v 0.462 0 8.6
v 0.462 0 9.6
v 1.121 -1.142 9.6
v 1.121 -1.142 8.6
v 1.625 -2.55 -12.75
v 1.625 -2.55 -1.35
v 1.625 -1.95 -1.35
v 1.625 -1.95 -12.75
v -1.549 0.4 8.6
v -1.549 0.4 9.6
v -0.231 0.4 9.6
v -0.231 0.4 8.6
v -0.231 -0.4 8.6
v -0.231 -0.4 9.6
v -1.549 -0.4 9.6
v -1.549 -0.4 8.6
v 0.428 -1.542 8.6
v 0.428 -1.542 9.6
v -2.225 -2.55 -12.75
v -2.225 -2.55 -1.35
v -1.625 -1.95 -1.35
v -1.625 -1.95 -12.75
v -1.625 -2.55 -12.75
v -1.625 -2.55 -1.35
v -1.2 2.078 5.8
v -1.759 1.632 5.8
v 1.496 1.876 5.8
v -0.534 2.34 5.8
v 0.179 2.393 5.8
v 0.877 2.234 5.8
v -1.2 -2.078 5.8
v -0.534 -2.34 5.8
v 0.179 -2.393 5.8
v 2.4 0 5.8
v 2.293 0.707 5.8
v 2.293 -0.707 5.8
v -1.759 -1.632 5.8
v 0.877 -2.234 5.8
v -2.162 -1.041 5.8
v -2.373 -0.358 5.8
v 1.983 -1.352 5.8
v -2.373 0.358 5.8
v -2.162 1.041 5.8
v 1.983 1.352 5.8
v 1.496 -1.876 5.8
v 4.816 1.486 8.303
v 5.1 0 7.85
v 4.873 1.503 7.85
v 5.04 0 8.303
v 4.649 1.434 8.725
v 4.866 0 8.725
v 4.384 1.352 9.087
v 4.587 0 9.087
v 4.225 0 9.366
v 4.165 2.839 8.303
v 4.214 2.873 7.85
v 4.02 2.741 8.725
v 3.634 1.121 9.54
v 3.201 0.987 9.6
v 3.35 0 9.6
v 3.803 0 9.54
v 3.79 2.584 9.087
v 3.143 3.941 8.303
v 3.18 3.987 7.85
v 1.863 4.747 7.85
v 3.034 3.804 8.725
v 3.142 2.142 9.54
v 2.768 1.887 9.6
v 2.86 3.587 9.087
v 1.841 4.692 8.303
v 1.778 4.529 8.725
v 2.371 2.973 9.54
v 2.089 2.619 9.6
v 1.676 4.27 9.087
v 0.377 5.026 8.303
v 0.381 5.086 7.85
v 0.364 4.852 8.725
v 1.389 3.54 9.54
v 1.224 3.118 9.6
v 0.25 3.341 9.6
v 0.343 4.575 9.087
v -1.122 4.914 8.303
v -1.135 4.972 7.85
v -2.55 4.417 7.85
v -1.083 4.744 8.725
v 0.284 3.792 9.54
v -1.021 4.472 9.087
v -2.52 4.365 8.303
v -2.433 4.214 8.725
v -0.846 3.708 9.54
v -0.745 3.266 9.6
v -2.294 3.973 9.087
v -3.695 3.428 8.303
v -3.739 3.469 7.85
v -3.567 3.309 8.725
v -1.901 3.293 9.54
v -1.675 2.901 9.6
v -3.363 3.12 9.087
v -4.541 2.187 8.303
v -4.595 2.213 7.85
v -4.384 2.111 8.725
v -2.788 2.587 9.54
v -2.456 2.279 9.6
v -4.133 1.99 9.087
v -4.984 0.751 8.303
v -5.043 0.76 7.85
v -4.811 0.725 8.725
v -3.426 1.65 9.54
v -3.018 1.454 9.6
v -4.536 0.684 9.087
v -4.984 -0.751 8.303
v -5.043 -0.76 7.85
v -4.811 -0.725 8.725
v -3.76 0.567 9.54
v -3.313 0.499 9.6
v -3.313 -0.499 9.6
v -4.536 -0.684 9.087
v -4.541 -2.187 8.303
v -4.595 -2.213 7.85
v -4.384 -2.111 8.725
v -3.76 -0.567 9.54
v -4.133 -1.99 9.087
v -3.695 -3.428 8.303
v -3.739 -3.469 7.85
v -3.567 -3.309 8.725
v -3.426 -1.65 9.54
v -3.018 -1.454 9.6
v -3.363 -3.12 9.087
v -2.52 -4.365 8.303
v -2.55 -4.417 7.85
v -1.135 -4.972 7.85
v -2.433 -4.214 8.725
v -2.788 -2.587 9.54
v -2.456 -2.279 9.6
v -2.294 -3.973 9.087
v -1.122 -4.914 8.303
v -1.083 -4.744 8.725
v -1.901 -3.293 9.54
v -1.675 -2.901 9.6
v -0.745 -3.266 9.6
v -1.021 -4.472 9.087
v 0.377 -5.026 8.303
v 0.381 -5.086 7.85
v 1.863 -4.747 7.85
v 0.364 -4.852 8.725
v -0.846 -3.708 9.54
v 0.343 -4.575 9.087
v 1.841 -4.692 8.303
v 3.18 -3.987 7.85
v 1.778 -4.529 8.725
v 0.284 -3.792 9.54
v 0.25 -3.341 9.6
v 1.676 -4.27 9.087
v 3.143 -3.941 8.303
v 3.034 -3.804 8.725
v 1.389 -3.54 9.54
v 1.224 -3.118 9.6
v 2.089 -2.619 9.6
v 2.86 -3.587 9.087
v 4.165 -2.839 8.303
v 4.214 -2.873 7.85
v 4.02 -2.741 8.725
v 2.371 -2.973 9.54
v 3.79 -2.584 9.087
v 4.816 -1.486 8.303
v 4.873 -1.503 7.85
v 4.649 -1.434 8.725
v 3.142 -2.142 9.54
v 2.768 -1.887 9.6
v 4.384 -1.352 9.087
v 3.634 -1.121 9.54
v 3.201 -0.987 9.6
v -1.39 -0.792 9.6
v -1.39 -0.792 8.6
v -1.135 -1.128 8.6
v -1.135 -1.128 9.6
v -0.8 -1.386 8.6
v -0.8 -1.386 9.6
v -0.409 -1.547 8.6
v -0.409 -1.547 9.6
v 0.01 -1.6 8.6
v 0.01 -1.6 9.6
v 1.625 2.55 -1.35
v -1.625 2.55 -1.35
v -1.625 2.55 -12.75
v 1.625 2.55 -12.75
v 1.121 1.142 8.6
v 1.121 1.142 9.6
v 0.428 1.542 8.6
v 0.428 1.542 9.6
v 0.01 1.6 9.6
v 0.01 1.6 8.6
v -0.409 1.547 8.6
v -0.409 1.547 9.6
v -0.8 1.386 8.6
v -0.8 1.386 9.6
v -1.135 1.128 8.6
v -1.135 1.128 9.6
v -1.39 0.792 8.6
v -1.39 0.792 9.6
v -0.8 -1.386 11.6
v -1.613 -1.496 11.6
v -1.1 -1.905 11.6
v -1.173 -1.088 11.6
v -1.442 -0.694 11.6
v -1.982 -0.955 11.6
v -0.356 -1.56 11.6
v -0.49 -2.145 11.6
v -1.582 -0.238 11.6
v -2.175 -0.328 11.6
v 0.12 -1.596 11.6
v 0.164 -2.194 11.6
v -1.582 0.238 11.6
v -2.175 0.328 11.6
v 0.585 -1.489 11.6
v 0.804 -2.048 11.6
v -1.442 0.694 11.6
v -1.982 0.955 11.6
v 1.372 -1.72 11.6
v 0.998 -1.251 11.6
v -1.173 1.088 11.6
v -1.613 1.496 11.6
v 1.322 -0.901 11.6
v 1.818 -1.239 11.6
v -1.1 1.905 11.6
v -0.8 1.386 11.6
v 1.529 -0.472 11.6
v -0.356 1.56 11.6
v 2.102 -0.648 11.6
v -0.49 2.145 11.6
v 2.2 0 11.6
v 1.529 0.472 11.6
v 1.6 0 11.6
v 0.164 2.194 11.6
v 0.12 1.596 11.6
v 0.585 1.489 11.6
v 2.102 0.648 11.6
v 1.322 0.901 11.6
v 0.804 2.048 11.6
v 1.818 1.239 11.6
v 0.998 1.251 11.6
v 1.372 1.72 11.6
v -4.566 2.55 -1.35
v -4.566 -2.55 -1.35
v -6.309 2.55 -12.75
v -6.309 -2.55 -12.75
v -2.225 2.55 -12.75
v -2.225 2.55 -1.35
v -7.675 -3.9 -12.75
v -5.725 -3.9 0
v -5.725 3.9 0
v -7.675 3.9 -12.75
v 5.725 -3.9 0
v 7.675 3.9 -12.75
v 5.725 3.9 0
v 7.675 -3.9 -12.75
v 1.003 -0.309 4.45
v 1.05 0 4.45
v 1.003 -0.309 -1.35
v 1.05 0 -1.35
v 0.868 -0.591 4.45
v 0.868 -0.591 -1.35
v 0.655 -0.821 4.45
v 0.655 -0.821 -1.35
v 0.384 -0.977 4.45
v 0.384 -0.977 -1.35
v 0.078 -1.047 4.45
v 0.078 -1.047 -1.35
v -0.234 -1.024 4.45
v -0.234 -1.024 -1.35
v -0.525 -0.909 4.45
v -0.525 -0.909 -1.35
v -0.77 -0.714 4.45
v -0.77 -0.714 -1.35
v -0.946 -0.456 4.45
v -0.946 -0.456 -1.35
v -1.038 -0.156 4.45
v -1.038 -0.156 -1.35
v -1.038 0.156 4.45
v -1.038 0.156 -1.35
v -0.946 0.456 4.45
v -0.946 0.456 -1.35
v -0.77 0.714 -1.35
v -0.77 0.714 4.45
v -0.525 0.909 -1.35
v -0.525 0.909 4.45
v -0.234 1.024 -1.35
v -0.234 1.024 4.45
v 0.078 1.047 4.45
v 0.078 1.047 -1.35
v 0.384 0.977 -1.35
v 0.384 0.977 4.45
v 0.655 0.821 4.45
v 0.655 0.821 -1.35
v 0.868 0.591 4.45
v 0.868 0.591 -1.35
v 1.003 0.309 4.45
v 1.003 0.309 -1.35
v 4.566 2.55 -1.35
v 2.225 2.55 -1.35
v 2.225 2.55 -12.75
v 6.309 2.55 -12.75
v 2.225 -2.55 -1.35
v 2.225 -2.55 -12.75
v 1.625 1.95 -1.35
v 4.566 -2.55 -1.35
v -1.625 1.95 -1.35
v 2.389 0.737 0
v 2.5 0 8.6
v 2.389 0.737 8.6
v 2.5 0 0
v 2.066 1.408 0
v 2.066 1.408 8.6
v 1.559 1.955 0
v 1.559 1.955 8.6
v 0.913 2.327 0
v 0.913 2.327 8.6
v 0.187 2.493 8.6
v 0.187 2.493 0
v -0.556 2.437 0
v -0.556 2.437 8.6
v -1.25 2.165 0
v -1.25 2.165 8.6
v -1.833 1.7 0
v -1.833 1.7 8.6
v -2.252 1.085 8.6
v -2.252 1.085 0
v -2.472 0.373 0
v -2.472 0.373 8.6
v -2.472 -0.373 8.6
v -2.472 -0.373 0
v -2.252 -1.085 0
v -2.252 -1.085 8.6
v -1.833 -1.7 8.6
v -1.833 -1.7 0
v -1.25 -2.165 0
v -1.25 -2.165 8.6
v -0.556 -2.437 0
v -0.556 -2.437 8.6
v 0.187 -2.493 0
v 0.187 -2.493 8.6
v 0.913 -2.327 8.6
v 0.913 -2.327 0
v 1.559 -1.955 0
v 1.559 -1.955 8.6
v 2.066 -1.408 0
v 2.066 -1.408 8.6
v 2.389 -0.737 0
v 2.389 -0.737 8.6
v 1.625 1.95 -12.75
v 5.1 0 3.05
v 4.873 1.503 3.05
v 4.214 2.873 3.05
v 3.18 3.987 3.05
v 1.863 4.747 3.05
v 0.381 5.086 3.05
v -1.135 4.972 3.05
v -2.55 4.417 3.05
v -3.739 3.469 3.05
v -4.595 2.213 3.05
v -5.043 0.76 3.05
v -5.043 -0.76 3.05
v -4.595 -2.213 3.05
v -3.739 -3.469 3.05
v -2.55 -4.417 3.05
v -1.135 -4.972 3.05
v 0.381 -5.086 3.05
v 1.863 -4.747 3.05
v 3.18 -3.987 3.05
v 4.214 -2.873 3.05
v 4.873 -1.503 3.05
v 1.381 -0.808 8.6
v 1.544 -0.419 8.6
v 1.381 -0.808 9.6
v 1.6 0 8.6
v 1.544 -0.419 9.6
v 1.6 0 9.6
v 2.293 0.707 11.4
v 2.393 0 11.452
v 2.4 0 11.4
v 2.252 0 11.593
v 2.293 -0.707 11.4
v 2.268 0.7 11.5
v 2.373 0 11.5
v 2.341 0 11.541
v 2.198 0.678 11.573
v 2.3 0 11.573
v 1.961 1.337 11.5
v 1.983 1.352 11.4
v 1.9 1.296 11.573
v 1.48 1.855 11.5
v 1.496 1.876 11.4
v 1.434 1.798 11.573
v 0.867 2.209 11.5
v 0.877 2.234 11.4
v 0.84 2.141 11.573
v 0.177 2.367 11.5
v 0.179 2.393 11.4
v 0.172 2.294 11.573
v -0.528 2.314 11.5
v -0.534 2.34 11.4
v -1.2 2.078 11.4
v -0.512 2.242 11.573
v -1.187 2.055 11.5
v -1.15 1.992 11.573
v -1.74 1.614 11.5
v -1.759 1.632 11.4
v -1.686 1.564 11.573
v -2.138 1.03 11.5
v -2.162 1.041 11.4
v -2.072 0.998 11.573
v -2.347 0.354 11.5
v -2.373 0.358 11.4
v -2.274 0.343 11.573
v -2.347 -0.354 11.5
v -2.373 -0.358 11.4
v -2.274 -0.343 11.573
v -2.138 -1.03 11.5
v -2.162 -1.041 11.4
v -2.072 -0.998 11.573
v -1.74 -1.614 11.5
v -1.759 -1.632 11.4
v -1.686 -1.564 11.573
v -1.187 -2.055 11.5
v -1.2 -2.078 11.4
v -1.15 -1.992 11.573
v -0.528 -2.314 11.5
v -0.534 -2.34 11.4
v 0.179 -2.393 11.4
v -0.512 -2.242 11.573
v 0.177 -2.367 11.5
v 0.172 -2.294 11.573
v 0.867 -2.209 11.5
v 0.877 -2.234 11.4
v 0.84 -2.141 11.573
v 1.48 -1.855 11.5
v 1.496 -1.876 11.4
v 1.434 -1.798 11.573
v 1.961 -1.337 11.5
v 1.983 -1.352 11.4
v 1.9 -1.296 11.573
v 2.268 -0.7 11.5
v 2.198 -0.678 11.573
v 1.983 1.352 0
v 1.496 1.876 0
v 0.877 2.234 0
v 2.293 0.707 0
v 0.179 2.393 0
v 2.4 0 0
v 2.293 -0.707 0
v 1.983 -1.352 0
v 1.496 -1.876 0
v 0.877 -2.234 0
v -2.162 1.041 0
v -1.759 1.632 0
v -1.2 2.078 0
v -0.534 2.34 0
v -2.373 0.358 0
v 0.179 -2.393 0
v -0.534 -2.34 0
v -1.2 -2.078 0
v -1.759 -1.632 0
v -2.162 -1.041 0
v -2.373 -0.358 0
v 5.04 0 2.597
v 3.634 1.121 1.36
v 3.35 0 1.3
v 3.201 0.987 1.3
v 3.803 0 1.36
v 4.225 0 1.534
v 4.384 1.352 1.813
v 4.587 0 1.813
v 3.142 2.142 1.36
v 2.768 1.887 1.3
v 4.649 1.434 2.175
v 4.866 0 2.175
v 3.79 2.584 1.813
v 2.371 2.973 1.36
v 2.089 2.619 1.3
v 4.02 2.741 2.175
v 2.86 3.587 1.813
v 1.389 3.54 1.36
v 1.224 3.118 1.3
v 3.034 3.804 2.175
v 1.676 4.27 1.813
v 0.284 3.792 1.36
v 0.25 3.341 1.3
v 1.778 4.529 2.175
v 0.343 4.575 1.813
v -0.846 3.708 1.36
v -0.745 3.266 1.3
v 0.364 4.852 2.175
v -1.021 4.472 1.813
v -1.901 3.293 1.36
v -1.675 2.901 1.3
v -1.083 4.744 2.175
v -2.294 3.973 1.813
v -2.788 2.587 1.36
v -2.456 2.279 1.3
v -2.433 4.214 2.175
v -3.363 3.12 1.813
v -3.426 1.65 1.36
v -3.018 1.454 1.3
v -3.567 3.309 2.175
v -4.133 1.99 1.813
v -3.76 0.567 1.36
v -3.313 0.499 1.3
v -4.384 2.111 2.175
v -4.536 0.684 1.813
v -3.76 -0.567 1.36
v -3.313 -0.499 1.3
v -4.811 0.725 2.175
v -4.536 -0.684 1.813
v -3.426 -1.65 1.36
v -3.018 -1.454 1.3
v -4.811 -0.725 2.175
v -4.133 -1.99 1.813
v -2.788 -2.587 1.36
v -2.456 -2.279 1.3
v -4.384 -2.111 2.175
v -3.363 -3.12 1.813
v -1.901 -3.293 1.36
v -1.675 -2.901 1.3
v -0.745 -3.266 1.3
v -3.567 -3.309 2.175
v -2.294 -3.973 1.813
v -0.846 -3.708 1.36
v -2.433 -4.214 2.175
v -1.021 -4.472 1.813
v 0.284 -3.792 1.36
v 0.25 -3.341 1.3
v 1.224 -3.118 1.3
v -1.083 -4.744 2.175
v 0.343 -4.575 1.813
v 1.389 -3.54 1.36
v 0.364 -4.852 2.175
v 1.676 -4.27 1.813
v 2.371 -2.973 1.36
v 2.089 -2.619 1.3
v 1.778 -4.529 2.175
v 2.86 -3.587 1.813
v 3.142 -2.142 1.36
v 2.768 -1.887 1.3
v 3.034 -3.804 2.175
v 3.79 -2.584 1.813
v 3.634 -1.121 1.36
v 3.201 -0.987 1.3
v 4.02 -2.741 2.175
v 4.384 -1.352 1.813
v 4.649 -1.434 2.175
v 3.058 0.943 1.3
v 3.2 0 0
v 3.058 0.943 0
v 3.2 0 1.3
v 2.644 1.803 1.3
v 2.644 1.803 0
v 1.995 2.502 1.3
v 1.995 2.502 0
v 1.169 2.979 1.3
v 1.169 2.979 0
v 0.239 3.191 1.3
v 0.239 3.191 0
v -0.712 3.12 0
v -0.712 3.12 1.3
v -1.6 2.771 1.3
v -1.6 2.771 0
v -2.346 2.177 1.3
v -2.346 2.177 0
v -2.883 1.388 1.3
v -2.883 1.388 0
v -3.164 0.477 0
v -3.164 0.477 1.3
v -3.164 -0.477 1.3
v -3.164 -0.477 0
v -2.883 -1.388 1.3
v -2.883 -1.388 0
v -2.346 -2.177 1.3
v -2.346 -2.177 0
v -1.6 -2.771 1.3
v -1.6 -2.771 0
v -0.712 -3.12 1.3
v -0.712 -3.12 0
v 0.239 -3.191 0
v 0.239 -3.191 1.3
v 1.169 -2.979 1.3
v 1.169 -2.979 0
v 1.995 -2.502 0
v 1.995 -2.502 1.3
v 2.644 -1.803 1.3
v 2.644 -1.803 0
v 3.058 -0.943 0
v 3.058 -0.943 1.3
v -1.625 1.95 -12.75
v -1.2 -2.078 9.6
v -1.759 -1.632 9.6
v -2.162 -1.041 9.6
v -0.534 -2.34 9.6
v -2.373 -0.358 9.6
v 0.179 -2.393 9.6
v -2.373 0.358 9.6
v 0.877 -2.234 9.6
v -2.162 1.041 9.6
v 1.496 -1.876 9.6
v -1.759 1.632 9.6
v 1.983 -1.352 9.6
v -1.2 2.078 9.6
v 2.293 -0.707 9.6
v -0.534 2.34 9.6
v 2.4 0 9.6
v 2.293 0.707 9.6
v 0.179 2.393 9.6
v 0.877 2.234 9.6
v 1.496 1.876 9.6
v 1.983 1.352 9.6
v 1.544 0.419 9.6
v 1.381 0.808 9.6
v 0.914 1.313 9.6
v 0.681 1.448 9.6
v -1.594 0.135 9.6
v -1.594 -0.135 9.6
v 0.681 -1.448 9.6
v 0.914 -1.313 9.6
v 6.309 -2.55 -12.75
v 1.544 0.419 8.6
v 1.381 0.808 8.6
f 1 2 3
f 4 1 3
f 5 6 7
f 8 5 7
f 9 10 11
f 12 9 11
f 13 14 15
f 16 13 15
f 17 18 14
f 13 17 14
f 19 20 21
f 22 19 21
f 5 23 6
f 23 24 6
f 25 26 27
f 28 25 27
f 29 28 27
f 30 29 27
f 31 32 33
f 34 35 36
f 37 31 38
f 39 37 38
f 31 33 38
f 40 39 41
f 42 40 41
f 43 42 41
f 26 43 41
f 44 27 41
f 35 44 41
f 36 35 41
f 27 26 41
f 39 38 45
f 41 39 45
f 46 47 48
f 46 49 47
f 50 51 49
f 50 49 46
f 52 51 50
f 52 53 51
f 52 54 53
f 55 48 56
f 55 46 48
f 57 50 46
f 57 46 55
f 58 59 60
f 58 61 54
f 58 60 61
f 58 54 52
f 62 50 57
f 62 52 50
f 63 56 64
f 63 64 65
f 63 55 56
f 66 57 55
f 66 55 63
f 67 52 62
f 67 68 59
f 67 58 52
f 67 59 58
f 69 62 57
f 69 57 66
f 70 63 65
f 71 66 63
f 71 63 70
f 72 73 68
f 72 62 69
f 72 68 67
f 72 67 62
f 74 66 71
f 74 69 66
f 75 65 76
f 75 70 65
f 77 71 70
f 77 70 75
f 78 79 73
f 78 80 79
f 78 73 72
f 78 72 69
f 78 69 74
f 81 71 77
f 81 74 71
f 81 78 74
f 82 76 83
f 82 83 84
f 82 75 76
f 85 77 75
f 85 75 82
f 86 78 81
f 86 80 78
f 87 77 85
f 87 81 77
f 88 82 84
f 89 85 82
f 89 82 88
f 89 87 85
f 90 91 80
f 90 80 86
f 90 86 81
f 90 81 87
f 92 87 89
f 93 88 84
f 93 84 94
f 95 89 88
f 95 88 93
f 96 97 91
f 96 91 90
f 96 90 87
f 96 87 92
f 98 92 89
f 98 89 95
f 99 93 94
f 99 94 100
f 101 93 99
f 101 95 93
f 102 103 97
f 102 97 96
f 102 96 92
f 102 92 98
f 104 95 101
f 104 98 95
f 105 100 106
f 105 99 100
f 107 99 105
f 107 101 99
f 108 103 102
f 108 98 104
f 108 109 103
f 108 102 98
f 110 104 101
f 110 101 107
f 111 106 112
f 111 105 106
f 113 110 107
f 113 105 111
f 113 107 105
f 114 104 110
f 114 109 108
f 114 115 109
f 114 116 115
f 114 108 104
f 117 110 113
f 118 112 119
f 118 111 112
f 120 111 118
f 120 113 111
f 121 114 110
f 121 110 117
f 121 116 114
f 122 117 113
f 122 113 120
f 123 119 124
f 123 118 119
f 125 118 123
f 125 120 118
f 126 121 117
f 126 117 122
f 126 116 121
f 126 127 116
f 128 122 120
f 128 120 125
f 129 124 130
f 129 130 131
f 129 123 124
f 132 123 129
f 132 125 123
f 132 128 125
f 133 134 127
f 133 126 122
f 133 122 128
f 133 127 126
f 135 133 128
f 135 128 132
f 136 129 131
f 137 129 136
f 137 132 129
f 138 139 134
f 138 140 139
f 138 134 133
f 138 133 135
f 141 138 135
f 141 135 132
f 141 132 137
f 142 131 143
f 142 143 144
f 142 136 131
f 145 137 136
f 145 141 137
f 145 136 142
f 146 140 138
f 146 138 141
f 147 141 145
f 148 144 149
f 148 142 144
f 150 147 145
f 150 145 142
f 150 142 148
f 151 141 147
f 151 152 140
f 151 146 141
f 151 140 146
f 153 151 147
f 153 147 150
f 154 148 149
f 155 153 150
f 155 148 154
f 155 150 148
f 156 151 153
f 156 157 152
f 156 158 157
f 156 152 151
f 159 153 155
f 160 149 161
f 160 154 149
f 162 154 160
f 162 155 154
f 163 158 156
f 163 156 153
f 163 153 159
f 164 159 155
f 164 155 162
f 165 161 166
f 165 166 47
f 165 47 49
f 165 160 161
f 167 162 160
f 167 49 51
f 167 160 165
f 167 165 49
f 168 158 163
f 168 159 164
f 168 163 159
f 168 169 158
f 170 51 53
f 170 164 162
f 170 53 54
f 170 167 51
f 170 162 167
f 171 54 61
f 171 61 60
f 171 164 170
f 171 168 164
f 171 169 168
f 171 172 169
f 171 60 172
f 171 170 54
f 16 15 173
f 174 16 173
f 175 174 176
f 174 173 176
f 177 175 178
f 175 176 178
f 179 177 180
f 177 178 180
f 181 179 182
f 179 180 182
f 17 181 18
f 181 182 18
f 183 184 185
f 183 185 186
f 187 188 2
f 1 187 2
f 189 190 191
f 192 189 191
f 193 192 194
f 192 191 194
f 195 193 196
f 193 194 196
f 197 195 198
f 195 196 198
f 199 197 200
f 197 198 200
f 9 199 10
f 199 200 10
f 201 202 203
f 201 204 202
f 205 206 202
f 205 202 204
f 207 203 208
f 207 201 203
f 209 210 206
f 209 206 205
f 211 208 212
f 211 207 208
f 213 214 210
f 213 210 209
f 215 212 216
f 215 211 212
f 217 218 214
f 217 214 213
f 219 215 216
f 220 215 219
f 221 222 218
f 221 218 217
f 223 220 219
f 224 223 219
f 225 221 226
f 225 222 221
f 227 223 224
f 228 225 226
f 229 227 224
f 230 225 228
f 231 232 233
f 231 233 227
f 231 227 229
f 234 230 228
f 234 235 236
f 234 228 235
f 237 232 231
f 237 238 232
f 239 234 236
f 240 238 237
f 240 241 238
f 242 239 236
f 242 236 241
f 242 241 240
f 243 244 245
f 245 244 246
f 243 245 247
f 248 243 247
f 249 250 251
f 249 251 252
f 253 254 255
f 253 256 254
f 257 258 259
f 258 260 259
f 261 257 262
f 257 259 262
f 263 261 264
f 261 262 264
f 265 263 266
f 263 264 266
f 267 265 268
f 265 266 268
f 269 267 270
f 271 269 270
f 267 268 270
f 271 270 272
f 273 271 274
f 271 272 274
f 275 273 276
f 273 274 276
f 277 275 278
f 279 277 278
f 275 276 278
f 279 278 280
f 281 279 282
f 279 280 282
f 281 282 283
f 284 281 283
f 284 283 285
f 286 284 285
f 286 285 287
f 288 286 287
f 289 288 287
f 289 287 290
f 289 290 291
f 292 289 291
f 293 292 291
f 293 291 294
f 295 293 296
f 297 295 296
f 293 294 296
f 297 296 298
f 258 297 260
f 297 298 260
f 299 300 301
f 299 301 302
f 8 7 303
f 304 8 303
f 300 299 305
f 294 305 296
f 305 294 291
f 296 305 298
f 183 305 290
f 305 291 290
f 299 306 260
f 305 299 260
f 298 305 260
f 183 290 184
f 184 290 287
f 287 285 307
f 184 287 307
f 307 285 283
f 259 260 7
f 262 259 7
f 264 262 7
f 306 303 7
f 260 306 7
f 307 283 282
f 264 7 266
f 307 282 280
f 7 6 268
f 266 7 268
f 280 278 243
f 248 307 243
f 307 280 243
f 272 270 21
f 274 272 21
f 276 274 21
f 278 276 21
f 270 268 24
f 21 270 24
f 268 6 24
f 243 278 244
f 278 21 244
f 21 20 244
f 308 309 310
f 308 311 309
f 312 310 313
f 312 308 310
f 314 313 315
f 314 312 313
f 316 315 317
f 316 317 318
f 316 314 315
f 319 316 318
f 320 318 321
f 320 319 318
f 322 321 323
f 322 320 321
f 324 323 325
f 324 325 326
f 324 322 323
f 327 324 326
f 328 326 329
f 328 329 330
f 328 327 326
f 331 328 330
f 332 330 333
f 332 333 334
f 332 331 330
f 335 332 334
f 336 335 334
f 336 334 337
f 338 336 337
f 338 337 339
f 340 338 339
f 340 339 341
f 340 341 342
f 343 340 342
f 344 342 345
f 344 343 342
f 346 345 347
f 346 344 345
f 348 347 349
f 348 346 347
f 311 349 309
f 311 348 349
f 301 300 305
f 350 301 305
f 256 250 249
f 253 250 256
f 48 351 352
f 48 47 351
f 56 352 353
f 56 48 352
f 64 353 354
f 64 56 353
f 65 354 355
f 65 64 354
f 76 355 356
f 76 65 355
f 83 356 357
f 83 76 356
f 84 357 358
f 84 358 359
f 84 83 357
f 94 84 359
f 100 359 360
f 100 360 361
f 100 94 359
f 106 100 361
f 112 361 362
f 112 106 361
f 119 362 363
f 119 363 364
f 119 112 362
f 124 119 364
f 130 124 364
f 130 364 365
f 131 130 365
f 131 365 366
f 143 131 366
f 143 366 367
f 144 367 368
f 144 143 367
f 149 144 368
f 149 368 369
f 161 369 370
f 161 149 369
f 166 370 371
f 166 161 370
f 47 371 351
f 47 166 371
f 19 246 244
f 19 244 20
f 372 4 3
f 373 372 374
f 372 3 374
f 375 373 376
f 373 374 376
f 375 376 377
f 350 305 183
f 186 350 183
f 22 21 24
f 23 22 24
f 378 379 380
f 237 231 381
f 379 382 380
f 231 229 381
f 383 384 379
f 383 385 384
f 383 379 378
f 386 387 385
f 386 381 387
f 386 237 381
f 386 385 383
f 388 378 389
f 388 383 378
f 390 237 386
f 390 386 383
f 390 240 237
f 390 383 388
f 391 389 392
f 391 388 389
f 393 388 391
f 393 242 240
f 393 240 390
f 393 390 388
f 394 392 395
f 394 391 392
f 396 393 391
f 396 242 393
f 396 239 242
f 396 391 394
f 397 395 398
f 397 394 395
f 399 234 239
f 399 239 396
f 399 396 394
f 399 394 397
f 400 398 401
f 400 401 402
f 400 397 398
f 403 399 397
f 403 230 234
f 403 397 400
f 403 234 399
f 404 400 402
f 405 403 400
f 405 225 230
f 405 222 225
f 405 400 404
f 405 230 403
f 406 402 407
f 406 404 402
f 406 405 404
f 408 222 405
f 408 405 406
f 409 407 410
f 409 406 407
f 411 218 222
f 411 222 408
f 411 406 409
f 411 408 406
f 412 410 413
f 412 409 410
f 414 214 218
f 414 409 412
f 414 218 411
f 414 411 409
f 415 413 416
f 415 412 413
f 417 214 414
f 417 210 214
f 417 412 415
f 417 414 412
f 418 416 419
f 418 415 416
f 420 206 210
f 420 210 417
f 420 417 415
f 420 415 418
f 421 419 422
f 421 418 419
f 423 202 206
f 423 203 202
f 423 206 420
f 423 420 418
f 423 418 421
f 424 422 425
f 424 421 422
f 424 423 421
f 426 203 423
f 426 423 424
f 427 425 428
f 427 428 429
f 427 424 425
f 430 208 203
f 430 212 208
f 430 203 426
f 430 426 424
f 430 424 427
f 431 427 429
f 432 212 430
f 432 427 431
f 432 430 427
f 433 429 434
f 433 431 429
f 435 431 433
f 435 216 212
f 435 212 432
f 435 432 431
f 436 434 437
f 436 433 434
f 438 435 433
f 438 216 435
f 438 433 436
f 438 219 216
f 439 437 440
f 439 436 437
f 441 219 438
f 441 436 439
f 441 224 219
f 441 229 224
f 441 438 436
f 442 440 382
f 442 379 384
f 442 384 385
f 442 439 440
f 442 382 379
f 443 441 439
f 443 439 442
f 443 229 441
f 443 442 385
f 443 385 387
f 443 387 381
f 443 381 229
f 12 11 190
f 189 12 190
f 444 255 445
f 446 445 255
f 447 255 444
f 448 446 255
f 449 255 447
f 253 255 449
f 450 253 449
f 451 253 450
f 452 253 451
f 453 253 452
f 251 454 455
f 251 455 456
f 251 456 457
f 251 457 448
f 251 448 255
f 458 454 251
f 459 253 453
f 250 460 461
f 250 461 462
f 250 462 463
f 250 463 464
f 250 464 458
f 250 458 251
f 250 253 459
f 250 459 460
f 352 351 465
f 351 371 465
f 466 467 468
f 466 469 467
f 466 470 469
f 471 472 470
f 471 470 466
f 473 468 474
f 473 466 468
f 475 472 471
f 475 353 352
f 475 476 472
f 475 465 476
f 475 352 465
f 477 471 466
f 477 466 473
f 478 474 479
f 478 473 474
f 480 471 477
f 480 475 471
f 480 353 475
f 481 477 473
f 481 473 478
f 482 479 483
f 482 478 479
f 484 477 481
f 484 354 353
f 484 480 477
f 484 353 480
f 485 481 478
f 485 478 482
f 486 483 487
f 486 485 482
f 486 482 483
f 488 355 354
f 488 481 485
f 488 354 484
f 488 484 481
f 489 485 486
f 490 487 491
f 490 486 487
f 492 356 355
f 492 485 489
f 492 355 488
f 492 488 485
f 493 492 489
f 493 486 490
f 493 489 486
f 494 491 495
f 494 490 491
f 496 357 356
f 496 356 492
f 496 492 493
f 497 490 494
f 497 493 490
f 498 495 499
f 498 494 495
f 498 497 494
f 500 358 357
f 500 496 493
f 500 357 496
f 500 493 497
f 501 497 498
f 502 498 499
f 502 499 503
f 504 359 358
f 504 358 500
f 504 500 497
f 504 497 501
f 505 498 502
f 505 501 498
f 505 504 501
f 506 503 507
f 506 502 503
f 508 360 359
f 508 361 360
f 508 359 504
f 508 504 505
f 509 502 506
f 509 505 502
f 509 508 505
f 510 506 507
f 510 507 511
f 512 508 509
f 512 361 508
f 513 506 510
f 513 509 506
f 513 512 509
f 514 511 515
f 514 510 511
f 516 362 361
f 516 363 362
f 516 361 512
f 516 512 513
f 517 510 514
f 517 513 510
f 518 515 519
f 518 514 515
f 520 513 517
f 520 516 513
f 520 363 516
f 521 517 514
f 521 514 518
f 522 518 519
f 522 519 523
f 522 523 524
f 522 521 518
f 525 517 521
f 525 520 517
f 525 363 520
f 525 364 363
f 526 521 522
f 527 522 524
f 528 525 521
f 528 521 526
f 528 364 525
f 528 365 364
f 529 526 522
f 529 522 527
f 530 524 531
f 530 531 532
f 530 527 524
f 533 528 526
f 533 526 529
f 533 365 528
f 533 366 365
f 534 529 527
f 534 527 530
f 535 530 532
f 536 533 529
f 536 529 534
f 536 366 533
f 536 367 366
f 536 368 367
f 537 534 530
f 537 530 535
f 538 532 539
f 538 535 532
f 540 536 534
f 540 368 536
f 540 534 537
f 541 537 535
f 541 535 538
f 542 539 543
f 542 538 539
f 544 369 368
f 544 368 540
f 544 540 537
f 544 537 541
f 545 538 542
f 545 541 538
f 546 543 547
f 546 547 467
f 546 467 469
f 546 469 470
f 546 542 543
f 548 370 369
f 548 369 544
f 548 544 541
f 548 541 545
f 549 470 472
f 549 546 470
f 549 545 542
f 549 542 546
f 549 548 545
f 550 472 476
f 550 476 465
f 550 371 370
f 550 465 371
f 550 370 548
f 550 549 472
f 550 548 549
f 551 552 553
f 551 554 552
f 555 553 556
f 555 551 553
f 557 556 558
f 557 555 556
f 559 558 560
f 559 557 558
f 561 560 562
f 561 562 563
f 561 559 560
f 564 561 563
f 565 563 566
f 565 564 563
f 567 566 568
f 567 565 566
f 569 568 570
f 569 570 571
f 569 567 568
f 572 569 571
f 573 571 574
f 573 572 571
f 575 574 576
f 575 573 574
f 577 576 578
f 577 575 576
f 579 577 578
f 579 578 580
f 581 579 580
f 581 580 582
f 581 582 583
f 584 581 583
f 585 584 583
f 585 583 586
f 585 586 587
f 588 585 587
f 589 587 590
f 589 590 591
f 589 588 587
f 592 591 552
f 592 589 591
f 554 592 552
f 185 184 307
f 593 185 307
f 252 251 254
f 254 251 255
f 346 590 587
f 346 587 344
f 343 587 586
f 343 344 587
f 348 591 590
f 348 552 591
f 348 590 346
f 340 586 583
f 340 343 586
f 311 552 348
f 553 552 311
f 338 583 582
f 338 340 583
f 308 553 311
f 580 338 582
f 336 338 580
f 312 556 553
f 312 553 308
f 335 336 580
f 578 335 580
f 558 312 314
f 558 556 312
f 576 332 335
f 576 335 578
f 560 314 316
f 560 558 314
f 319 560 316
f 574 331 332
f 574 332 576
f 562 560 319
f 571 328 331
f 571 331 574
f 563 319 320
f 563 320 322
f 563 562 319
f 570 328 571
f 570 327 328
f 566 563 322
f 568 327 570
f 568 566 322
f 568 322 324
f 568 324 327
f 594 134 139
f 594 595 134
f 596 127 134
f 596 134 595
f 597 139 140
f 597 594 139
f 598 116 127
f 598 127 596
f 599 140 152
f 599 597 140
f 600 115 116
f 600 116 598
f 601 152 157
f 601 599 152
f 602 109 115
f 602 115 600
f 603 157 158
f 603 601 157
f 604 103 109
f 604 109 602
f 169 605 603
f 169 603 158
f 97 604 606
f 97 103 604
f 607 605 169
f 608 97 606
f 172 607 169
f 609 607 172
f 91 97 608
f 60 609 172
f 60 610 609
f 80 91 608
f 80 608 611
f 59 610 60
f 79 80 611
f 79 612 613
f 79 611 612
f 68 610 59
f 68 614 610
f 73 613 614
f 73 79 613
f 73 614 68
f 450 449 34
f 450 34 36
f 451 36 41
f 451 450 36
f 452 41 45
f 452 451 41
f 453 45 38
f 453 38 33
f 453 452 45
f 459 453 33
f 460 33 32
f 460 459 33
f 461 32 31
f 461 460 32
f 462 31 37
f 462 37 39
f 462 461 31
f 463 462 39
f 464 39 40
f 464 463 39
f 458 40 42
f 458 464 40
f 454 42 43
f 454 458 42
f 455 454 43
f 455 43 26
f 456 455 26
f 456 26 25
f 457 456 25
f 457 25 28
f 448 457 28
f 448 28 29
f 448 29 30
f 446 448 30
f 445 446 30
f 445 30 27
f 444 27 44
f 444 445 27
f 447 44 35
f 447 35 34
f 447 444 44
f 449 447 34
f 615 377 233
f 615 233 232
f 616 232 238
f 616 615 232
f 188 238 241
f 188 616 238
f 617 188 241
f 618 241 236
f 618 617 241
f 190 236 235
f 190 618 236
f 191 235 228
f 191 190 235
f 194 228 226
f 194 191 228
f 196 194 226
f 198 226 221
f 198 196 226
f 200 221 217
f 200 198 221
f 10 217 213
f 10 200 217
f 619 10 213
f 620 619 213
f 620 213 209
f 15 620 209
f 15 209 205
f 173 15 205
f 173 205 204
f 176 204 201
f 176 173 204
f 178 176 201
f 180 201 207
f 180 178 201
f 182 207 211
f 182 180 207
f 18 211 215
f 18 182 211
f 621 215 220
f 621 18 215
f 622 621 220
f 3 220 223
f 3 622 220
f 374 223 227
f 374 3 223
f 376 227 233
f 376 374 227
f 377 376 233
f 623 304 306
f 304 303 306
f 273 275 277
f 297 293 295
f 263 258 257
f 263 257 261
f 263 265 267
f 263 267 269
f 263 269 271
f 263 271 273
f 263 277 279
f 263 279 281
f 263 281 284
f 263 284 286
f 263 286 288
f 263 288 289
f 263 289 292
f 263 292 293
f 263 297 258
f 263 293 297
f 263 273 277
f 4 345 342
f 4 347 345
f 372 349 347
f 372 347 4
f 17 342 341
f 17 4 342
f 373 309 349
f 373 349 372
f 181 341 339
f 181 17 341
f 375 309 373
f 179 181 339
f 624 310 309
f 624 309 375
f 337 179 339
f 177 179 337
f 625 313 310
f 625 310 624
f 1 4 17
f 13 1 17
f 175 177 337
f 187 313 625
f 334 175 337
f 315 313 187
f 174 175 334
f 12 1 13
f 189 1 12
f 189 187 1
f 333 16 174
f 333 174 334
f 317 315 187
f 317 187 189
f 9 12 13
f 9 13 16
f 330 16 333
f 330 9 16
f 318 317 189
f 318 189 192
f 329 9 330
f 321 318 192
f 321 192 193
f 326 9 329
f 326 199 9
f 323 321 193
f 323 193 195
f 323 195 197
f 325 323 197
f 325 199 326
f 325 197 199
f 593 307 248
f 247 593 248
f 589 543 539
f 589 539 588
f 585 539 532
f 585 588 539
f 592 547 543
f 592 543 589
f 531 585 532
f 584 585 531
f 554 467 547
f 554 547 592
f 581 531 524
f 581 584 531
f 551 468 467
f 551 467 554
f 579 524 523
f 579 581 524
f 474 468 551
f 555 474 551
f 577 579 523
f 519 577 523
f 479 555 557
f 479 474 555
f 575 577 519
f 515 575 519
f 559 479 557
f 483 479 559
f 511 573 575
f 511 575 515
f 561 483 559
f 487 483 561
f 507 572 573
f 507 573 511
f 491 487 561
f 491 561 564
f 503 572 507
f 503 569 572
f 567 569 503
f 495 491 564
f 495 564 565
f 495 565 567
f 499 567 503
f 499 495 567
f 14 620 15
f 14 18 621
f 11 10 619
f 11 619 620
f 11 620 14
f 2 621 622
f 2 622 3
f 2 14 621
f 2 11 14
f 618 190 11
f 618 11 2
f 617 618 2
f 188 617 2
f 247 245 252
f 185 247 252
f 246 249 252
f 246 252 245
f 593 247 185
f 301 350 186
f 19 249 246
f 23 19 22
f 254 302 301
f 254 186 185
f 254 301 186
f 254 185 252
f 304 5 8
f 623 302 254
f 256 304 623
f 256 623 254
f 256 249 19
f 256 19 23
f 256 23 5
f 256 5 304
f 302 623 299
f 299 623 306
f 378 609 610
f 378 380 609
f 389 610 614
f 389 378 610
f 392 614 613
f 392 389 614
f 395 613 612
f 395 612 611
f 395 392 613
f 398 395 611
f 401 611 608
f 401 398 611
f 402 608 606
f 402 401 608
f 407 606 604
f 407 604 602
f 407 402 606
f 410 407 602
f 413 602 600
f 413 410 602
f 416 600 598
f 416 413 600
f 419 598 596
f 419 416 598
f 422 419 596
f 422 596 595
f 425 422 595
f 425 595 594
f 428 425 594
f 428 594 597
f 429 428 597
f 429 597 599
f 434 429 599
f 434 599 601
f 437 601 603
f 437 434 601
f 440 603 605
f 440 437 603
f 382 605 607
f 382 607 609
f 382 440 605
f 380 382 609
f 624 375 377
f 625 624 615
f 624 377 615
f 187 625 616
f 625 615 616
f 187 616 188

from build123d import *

# Parameters (mm, degrees)
F3_DEPTH  = 25
F4_R      = 2.4
F5_DEPTH  = 5.8
F7_DEPTH  = 3.9
F8_T      = -1.35
F10_DEPTH = 11.4


with BuildPart() as f1:
    # F0 (on Front) → F1 (revolve)
    with BuildSketch(Plane.XZ):
        with BuildLine():
            Line((0, 9.6), (0, 8.6))
            Line((0, 8.6), (2.5, 8.6))
            Line((2.5, 8.6), (2.5, 0))
            Line((2.5, 0), (3.2, 0))
            Line((3.2, 0), (3.2, 1.3))
            Line((3.2, 1.3), (3.35, 1.3))
            ThreePointArc((3.35, 1.3), (4.5874368671, 1.8125631329), (5.1, 3.05))
            Line((5.1, 3.05), (5.1, 7.85))
            ThreePointArc((5.1, 7.85), (4.5874368671, 9.0874368671), (3.35, 9.6))
            Line((3.35, 9.6), (2.4, 9.6))
            Line((2.4, 9.6), (2.4, 11.4))
            ThreePointArc((2.4, 11.4), (2.3414213562, 11.5414213562), (2.2, 11.6))
            Line((2.2, 11.6), (1.6, 11.6))
            Line((1.6, 11.6), (1.6, 9.6))
            Line((1.6, 9.6), (0, 9.6))
        make_face()
    revolve(axis=Axis((0, 0, 5.8), (0, 0, 1)))

    # F2 (on face) → F3 (cut)
    with BuildSketch(Plane.XY.offset(9.6)):
        with BuildLine():
            Line((-1.5491933385, 0.4), (-0.2309401077, 0.4))
            Line((-0.2309401077, 0.4), (0.4281865077, 1.5416407865))
            ThreePointArc((0.4281865077, 1.5416407865), (-0.8, 1.3856406461), (-1.5491933385, 0.4))
        make_face()
        with BuildLine():
            Line((1.1210068308, 1.1416407865), (0.4618802154, 0))
            Line((0.4618802154, 0), (1.1210068308, -1.1416407865))
            ThreePointArc((1.1210068308, -1.1416407865), (1.4754001032, -0.6190270878), (1.6, 0))
            ThreePointArc((1.6, 0), (1.4754001032, 0.6190270878), (1.1210068308, 1.1416407865))
        make_face()
        with BuildLine():
            Line((0.4281865077, -1.5416407865), (-0.2309401077, -0.4))
            Line((-0.2309401077, -0.4), (-1.5491933385, -0.4))
            ThreePointArc((-1.5491933385, -0.4), (-0.8, -1.3856406461), (0.4281865077, -1.5416407865))
        make_face()
    extrude(amount=-F3_DEPTH, mode=Mode.SUBTRACT)


with BuildPart() as f5:
    # F4 (on face) → F5 (new body)
    with BuildSketch(Plane(origin=(0, 0, 0), x_dir=(1, 0, 0), z_dir=(0, 0, -1))):
        Circle(F4_R)
    extrude(amount=-F5_DEPTH)

    # F6 (on Front) → F7 (join, symmetric)
    with BuildSketch(Plane.XZ):
        Polygon((5.725, 0), (0, 0), (-5.725, 0), (-7.675, -12.75), (7.675, -12.75), align=None)
    extrude(amount=F7_DEPTH, both=True)

    # F8
    f8_openings = [f5.faces().sort_by_distance(p)[0] for p in [
        (0, 0, -12.75),
    ]]
    offset(amount=F8_T, openings=f8_openings, kind=Kind.INTERSECTION)

    # F9 (on face) → F10 (join, through all)
    with BuildSketch(Plane(origin=(0, 0, -1.35), x_dir=(1, 0, 0), z_dir=(0, 0, -1))):
        Polygon((-1.625, 1.95), (-1.625, 2.55), (-2.225, 2.55), align=None)
        Polygon((2.225, 2.55), (1.625, 2.55), (1.625, 1.95), align=None)
        Polygon((-2.225, -2.55), (-1.625, -2.55), (-1.625, -1.95), align=None)
        Polygon((1.625, -1.95), (1.625, -2.55), (2.225, -2.55), align=None)
    extrude(amount=F10_DEPTH)


solid = Compound([f1.part, f5.part])
